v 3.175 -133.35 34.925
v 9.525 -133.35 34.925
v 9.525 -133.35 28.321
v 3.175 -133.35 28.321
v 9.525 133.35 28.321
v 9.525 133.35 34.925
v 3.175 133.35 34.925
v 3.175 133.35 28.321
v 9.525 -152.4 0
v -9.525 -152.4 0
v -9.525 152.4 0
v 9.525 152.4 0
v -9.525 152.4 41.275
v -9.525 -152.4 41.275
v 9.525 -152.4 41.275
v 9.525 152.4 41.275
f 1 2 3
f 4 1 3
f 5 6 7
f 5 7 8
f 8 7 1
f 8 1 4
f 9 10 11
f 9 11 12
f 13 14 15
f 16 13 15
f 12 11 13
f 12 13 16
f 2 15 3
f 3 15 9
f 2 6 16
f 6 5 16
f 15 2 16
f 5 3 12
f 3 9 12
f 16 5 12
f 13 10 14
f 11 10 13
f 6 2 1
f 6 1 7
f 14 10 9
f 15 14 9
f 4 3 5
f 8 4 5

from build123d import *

# Parameters (mm, degrees)
SKETCH1_W           = 19.05
SKETCH1_H           = 304.8
BOSS_EXTRUDE1_DEPTH = 41.275
SKETCH2_W           = 6.604
SKETCH2_H           = 266.7
CUT_EXTRUDE1_DEPTH  = 6.35


with BuildPart() as part:
    # Sketch1 → Boss-Extrude1 (new body)
    with BuildSketch(Plane.XY):
        Rectangle(SKETCH1_W, SKETCH1_H)
    extrude(amount=BOSS_EXTRUDE1_DEPTH)

    # Sketch2 → Cut-Extrude1 (cut)
    with BuildSketch(Plane(origin=(9.525, 0, 0), x_dir=(0, 0, -1), z_dir=(1, 0, 0))):
        with Locations((-31.623, 0)):
            Rectangle(SKETCH2_W, SKETCH2_H)
    extrude(amount=-CUT_EXTRUDE1_DEPTH, mode=Mode.SUBTRACT)


solid = part.part
